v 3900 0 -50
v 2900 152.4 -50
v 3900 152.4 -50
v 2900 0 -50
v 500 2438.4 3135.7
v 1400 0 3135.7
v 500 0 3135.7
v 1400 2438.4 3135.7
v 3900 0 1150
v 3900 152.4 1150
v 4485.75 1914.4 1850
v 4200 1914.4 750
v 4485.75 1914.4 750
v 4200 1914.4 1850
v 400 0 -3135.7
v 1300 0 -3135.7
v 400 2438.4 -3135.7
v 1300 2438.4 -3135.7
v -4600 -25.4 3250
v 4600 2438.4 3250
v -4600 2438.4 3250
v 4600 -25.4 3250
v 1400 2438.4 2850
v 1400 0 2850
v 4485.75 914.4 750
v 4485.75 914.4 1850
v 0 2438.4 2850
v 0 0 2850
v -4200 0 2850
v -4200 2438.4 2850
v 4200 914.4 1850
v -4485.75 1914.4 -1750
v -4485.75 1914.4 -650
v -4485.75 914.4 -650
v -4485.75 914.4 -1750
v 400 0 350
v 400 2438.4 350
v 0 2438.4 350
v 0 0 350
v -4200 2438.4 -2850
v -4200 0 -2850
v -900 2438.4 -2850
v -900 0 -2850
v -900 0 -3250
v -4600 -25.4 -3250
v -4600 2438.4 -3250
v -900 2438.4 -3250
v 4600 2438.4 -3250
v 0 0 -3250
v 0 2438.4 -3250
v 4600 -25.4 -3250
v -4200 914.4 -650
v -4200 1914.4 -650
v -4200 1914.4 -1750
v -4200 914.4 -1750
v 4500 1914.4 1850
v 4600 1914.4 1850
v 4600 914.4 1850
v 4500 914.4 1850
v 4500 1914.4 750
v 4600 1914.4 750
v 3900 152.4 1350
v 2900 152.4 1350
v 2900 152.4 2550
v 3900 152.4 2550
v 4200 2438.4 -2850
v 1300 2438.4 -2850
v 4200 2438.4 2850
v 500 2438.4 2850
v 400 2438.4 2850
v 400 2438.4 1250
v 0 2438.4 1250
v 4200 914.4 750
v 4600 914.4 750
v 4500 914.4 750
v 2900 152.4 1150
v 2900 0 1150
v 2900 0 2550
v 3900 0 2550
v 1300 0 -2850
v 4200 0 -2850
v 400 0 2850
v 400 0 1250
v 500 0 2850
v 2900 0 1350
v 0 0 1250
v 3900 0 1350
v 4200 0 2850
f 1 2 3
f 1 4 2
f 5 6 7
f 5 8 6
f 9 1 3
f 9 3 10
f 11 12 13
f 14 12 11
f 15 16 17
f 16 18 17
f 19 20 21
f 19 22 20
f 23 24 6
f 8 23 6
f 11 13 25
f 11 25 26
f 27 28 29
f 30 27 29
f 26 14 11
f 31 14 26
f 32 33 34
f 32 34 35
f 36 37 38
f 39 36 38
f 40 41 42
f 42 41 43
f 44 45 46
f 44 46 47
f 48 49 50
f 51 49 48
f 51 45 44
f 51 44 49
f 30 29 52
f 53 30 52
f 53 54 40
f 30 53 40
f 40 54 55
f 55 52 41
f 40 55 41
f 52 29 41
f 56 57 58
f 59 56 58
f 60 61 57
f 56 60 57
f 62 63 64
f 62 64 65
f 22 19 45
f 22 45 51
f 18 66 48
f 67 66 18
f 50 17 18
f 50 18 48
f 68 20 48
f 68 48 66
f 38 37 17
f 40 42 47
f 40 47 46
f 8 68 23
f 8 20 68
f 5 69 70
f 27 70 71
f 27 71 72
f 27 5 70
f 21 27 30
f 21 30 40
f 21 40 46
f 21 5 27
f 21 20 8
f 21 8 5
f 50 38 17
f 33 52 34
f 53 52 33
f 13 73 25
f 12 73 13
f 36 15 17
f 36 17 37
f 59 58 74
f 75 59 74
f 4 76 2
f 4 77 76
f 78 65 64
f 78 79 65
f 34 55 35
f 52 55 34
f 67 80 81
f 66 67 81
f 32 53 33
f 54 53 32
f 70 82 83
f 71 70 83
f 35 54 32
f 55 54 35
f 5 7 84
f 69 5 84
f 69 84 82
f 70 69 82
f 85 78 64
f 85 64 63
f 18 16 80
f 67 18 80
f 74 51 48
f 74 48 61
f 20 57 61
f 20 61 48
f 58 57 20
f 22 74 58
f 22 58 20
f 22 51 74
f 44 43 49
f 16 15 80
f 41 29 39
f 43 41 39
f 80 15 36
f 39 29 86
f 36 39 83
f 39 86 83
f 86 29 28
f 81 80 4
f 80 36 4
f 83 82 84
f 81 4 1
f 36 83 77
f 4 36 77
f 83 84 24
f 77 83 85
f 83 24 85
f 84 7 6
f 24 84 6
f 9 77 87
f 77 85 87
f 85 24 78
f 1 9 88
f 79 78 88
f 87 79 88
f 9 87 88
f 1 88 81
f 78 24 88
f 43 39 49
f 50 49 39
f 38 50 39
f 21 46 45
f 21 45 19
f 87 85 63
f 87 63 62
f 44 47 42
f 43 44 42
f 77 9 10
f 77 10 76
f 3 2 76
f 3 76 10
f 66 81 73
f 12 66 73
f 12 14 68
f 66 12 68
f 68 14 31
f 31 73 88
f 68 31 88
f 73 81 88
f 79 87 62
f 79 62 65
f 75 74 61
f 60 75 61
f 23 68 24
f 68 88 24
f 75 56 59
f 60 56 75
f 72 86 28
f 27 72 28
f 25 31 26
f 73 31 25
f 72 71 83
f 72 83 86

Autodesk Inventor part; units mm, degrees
ref_plane "YZ Plane" through (0, 0, 0) normal (1, 0, 0) x (0, 1, 0)
ref_plane "XZ Plane" through (0, 0, 0) normal (0, 1, 0) x (-1, 0, 0)
ref_plane "XY Plane" through (0, 0, 0) normal (0, 0, 1) x (1, 0, 0)
sketch "Sketch1" plane through (0, 0, 0) normal (0, 1, 0) x (-1, 0, 0)
  line L0 (0, -4550) -> (0, 4550) projected
  line L1 (6440, 0) -> (-6440, 0) projected
  line L2 (0, -4550) -> (0, 4550) projected
  line L3 (-6440, 0) -> (6440, 0) projected
  line L4 (-1400, 2850) -> (-1400, 3250)
  line L5 (-500, 3250) -> (-500, 2850)
  line L6 (-4200, 2850) -> (-1400, 2850)
  line L7 (-4600, 3250) -> (-1400, 3250)
  line L8 (-500, 3250) -> (4600, 3250)
  line L9 (-1300, -3250) -> (-1300, -2850)
  line L10 (0, -3250) -> (-400, -3250)
  line L11 (-400, -3250) -> (-400, 350)
  line L12 (-400, 350) -> (0, 350)
  line L13 (0, 350) -> (0, -3250)
  line L14 (0, 3250) -> (-400, 3250)
  line L15 (-400, 2850) -> (-400, 1250)
  line L16 (-400, 1250) -> (0, 1250)
  line L17 (0, 1250) -> (0, 2850)
  line L18 (900, -3250) -> (900, -2850)
  line L19 (-500, 2850) -> (-400, 2850)
  line L20 (0, 2850) -> (4200, 2850)
  line L21 (-4200, -2850) -> (-4200, 750)
  line L22 (-4200, 1850) -> (-4200, 2850)
  line L23 (-4600, -3250) -> (-4600, 750)
  line L24 (-4600, 1850) -> (-4600, 3250)
  line L25 (4600, 3250) -> (4600, -650)
  line L26 (4600, -1750) -> (4600, -3250)
  line L27 (4200, 2850) -> (4200, -650)
  line L28 (4200, -1750) -> (4200, -2850)
  line L29 (4200, -2850) -> (900, -2850)
  line L30 (-1300, -2850) -> (-4200, -2850)
  line L31 (4600, -3250) -> (900, -3250)
  line L32 (-1300, -3250) -> (-4600, -3250)
  line L33 (-4600, 1850) -> (-4600, 750)
  line L34 (-4200, 1850) -> (-4200, 750)
  line L35 (4200, -1750) -> (4200, -650)
  line L36 (4600, -650) -> (4600, -1750)
  point P0 (0, 0)
  dimension "d5" = 900
  dimension "d11" = 900
  dimension "d12" = 400
  dimension "d14" = 900
  dimension "d19" = 6500
  dimension "d20" = 5700
  dimension "d21" = 1600
  dimension "d22" = 3600
  dimension "d23" = 9200
  dimension "d24" = 8400
  dimension "d25" = 2800
extrude "Extrusion1" add sketch "Sketch1" along normal blind 2438.4 contours L21 L30 L9 L32 L23 L1 | L1 L23 L33 L24 L7 L4 L6 L22 L34 L21 | L0 L1 L11 L12 | L16 L15 L19 L5 L8 L0 | L0 L10 L11 L1 | L0 L8 L25 L1 L27 L20 | L1 L25 L36 L26 L31 L18 L29 L28 L35 L27
sketch "Sketch2" plane through (0, 0, 0) normal (0, -1, 0) x (1, 0, 0)
  line L0 (-4600, -3250) -> (-4600, 3250) projected
  line L1 (-900, -3250) -> (-4600, -3250) projected
  line L2 (-900, -2850) -> (-900, -3250) projected
  line L3 (-4200, -2850) -> (-900, -2850) projected
  line L4 (-4200, 2850) -> (-4200, -2850) projected
  line L5 (0, 2850) -> (-4200, 2850) projected
  line L6 (0, 1250) -> (0, 2850) projected
  line L7 (400, 1250) -> (0, 1250) projected
  line L8 (400, 2850) -> (400, 1250) projected
  line L9 (500, 2850) -> (400, 2850) projected
  line L10 (500, 3250) -> (500, 2850) projected
  line L11 (-4600, 3250) -> (500, 3250) projected
  line L12 (-4600, 3250) -> (4600, 3250)
  line L13 (4600, 3250) -> (4600, -3250)
  line L14 (4600, -3250) -> (-4600, -3250)
  line L15 (-4600, -3250) -> (-4600, 3250)
  point P0 (0, 0)
extrude "Extrusion2" add sketch "Sketch2" along normal blind 25.4
sketch "Sketch3" plane through (0, 2438.4, 0) normal (0, 1, 0) x (1, 0, 0)
  line L0 (1400, -3250) -> (4600, -3250) projected
  line L1 (4600, -3250) -> (4600, 3250) projected
  line L2 (4600, 3250) -> (1300, 3250) projected
  line L3 (1300, 3250) -> (1300, 2850) projected
  line L4 (1300, 2850) -> (4200, 2850) projected
  line L5 (4200, 2850) -> (4200, -2850) projected
  line L6 (4200, -2850) -> (1400, -2850) projected
  line L7 (1400, -2850) -> (1400, -3250) projected
  line L8 (400, -350) -> (400, 3250) projected
  line L9 (400, 3250) -> (0, 3250) projected
  line L10 (0, 3250) -> (0, -350) projected
  line L11 (0, -350) -> (400, -350) projected
  line L12 (500, -3250) -> (1400, -3250)
  line L13 (1400, -3250) -> (1400, -3135.7)
  line L14 (1400, -3135.7) -> (500, -3135.7)
  line L15 (500, -3135.7) -> (500, -3250)
  line L16 (400, 3250) -> (1300, 3250)
  line L17 (1300, 3250) -> (1300, 3135.7)
  line L18 (1300, 3135.7) -> (400, 3135.7)
  line L19 (400, 3135.7) -> (400, 3250)
  point P0 (0, 0)
  dimension "d31" = 114.3
  dimension "d33" = 114.3
extrude "Extrusion3" add sketch "Sketch3" against normal up to surface (2438.4 mm away) contours L12 L15 L14 L7 | L3 L18 L8 L16
sketch "Sketch4" plane through (-4200, 2438.4, 2850) normal (1, 0, 0) x (0, 0, -1)
  line L0 (0, -2438.4) -> (5700, -2438.4) projected
  line L1 (5700, -2438.4) -> (5700, 0) projected
  line L2 (3500, -524) -> (4600, -524)
  line L3 (4600, -524) -> (4600, -1524)
  line L4 (4600, -1524) -> (3500, -1524)
  line L5 (3500, -1524) -> (3500, -524)
  point P0 (2850, -2438.4)
  dimension "d36" = 1100
  dimension "d37" = 1100
  dimension "d38" = 914.4
  dimension "d39" = 1000
extrude "Extrusion4" cut sketch "Sketch4" against normal blind 285.75
sketch "Sketch5" plane through (4200, 2438.4, -2850) normal (-1, 0, 0) x (0, 0, 1)
  line L0 (5700, -2438.4) -> (0, -2438.4) projected
  line L1 (5700, -2438.4) -> (5700, 0) projected
  line L2 (3600, -524) -> (4700, -524)
  line L3 (4700, -524) -> (4700, -1524)
  line L4 (4700, -1524) -> (3600, -1524)
  line L5 (3600, -1524) -> (3600, -524)
  point P0 (2850, -2438.4)
  dimension "d42" = 1000
  dimension "d43" = 1100
  dimension "d44" = 1000
  dimension "d45" = 914.4
extrude "Extrusion5" cut sketch "Sketch5" against normal blind 285.75
sketch "Sketch8" plane through (4600, 2438.4, 3250) normal (1, 0, 0) x (0, 0, -1)
  line L0 (1400, -1524) -> (2500, -1524) projected
  line L1 (2500, -524) -> (1400, -524) projected
  line L2 (2500, -1524) -> (2500, -524) projected
  line L3 (1400, -1524) -> (2500, -1524) projected
  line L4 (1400, -524) -> (1400, -1524) projected
  point P0 (3250, -2438.4)
extrude "Extrusion8" cut sketch "Sketch8" against normal blind 100
sketch "Sketch7" plane through (0, 0, 0) normal (0, 1, 0) x (1, 0, 0)
  line L0 (1400, -2850) -> (4200, -2850) projected
  line L1 (4200, -2850) -> (4200, 2850) projected
  line L2 (2900, 50) -> (3900, 50)
  line L3 (3900, 50) -> (3900, -1150)
  line L4 (3900, -1150) -> (2900, -1150)
  line L5 (2900, -1150) -> (2900, 50)
  line L6 (2900, -1350) -> (3900, -1350)
  line L7 (3900, -1350) -> (3900, -2550)
  line L8 (3900, -2550) -> (2900, -2550)
  line L9 (2900, -2550) -> (2900, -1350)
  point P0 (0, 0)
  dimension "d79" = 300
  dimension "d80" = 200
  dimension "d81" = 300
  dimension "d82" = 1200
  dimension "d83" = 1000
  dimension "d84" = 1200
extrude "Pallets" add sketch "Sketch7" along normal blind 152.4
sketch "Sketch6" plane through (0, 0, 0) normal (0, 1, 0) x (1, 0, 0)
  line L0 (400, -350) -> (400, 3135.7) projected
  line L1 (0, -350) -> (400, -350) projected
  line L2 (-900, 3250) -> (0, 3250) projected
  line L3 (-4200, 2850) -> (-900, 2850) projected
  line L4 (-4200, -2850) -> (-4200, 2850) projected
  line L5 (0, -2850) -> (-4200, -2850) projected
  line L6 (0, -1250) -> (0, -2850) projected
  circle A0 centre (700, -850) radius 152.4
  circle A1 centre (-3600, -2250) radius 152.4
  circle A2 centre (-3600, 2250) radius 152.4
  circle A3 centre (-600, -2250) radius 152.4
  line L7 (-2252.4, -202.4) -> (-1947.6, -202.4)
  line L8 (-1947.6, -202.4) -> (-1947.6, 102.4)
  line L9 (-1947.6, 102.4) -> (-2252.4, 102.4)
  line L10 (-2252.4, 102.4) -> (-2252.4, -202.4)
  line L11 (-2252.4, -202.4) -> (-1947.6, 102.4) construction
  line L12 (-1947.6, -202.4) -> (-2252.4, 102.4) construction
  line L13 (-602.4, 3097.6) -> (-297.6, 3097.6)
  line L14 (-602.4, 3402.4) -> (-602.4, 3097.6)
  line L15 (-602.4, 3097.6) -> (-421.9999, 3278.0001) construction
  line L16 (-297.6, 3097.6) -> (-602.4, 3402.4) construction
  line L17 (-602.4, 3402.4) -> (-297.6, 3097.6)
  line L18 (-900, 2850) -> (-900, 3250) projected
  ellipse E0 centre (-450, 3377) end of major axis (-450, 3123) minor radius 152.4
  point P0 (0, 0)
  point P1 (-2100, -50)
  point P2 (-450, 3250)
  dimension "d92" = 254
  dimension "d93" = 152.4
  dimension "d55" = 304.8
  dimension "d56" = 300
  dimension "d57" = 500
  dimension "d58" = 304.8
  dimension "d59" = 304.8
  dimension "d60" = 304.8
  dimension "d61" = 600
  dimension "d62" = 600
  dimension "d63" = 600
  dimension "d64" = 600
  dimension "d65" = 600
  dimension "d66" = 600
  dimension "d69" = 2800
  dimension "d70" = 2100
  dimension "d71" = 304.8
  dimension "d72" = 304.8
  dimension "d75" = 304.8
  dimension "d76" = 304.8
  dimension "d87" = 152.4
  dimension "d91" = 127
properties part number "DelCo_2012_West_Structure"
